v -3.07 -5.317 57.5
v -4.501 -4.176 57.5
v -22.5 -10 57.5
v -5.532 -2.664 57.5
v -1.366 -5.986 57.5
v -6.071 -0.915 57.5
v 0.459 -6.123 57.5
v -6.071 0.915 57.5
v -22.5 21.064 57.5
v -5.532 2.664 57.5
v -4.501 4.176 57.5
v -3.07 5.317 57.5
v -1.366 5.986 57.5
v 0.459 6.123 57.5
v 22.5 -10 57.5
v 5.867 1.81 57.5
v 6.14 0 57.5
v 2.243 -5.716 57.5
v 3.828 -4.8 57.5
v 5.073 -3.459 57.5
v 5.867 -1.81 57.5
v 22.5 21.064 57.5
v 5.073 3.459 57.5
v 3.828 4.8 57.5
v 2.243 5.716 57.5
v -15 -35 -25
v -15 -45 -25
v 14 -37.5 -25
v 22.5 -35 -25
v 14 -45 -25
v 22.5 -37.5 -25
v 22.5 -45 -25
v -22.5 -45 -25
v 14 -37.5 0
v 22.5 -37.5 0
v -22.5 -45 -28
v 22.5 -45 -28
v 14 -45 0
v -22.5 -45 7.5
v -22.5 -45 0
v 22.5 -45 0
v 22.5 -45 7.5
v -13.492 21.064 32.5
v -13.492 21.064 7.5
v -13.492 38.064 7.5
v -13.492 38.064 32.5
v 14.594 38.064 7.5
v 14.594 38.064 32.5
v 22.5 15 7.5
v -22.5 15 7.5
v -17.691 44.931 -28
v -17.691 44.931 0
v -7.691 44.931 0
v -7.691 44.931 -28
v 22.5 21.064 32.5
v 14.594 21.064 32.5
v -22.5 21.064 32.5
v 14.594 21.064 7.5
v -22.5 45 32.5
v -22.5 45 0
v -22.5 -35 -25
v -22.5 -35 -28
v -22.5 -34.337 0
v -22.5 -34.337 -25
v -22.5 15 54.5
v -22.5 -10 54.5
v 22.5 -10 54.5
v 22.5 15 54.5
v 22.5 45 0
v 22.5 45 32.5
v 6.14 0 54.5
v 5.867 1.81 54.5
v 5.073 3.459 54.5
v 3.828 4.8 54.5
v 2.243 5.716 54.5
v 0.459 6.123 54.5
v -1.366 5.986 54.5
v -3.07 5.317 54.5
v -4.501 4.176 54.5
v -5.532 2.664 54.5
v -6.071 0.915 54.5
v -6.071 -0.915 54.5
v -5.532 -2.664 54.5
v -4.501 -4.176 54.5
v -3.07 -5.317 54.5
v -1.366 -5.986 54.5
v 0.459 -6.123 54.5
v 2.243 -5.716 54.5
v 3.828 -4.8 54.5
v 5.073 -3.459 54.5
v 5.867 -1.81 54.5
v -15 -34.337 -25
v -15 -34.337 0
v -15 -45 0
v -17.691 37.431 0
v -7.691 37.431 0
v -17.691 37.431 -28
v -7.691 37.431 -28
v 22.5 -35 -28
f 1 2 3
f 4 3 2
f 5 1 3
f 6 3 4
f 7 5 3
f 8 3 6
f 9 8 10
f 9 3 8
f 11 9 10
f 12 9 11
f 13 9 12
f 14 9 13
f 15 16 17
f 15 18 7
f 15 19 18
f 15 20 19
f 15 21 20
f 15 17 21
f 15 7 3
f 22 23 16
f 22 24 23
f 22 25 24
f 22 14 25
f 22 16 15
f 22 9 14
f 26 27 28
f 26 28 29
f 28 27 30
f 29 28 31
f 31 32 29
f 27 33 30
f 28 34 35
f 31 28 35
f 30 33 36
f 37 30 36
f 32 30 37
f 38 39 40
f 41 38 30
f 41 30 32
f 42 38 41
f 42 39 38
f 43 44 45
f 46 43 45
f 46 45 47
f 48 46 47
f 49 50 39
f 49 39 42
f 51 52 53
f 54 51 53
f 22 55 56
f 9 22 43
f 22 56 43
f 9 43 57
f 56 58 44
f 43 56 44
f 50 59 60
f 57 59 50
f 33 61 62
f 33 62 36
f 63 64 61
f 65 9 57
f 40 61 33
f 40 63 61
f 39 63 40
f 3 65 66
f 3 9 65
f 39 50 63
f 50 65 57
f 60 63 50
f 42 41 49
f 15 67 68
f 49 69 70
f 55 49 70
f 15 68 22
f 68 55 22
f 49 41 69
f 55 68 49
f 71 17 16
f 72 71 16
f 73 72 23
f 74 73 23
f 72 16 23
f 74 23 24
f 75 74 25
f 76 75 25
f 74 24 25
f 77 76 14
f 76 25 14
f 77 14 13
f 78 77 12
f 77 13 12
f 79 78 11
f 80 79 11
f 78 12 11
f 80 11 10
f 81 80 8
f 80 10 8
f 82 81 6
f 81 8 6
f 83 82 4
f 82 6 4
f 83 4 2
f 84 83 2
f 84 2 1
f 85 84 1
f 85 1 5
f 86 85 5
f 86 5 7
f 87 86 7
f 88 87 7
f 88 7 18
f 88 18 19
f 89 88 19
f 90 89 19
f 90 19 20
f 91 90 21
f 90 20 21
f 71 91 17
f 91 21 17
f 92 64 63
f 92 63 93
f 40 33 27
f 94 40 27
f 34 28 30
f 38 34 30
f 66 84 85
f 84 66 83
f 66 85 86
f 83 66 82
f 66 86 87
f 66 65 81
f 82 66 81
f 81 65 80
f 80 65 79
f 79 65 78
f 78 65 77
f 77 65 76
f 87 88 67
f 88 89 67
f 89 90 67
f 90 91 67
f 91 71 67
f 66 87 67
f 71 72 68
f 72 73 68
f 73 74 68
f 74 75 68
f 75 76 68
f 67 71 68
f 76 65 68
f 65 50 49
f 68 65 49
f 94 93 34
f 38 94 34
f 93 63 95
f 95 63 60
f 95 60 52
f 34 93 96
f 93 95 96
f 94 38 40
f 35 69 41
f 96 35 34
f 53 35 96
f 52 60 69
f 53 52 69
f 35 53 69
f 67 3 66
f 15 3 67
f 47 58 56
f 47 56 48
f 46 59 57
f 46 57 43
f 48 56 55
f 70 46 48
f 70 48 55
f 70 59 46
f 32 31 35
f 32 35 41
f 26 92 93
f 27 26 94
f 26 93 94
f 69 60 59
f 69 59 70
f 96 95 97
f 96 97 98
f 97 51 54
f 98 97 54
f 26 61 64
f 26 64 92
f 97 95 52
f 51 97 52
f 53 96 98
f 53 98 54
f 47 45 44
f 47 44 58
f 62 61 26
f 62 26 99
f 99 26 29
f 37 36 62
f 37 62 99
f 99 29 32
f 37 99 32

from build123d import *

# Parameters (mm, degrees)
F0_W      = 45
F0_H      = 90
F1_DEPTH  = 7.5
F2_W      = 45
F2_H      = 30
F2_W_2    = 28.085665
F2_H_2    = 17
F3_DEPTH  = 25
F5_DEPTH  = 25
F6_W      = 45
F6_H      = 3
F7_DEPTH  = 25
F8_R      = 6.14005
F9_DEPTH  = 3
F10_W     = 8.500325
F10_H     = 7.5
F11_DEPTH = 25
F12_W     = 7.5
F12_H     = 10.662651
F13_DEPTH = 25
F14_W     = 10
F14_H     = 7.5
F15_DEPTH = 28
F16_W     = 45
F16_H     = 10
F17_DEPTH = 3


with BuildPart() as f1:
    # F0 (on Top) → F1 (new body)
    with BuildSketch(Plane.XY):
        Rectangle(F0_W, F0_H)
    extrude(amount=F1_DEPTH)

    # F2 (on face) → F3 (join)
    with BuildSketch(Plane.XY.offset(7.5)):
        with Locations((0, 30)):
            Rectangle(F2_W, F2_H)
        with Locations((0.5507, 29.56425)):
            Rectangle(F2_W_2, F2_H_2, mode=Mode.SUBTRACT)
    extrude(amount=F3_DEPTH)

    # F4 (on face) → F5 (join)
    with BuildSketch(Plane.XY.offset(32.5)):
        Polygon((-22.5, 15), (22.5, 15), (22.5, 21.06425), (14.593532, 21.06425), (-13.492133, 21.06425), (-22.5, 21.06425), align=None)
    extrude(amount=F5_DEPTH)

    # F6 (on face) → F7 (join)
    with BuildSketch(Plane.XZ.offset(-15)):
        with Locations((0, 56)):
            Rectangle(F6_W, F6_H)
    extrude(amount=F7_DEPTH)

    # F8 (on face) → F9 (cut, through all)
    with BuildSketch(Plane.XY.offset(57.5)):
        Circle(F8_R)
    extrude(amount=-F9_DEPTH, mode=Mode.SUBTRACT)

    # F10 (on face) → F11 (join)
    with BuildSketch(Plane(origin=(0, 0, 0), x_dir=(1, 0, 0), z_dir=(0, 0, -1))):
        with Locations((18.249837, 41.25)):
            Rectangle(F10_W, F10_H)
    extrude(amount=F11_DEPTH)

    # F12 (on face) → F13 (join)
    with BuildSketch(Plane(origin=(0, 0, 0), x_dir=(1, 0, 0), z_dir=(0, 0, -1))):
        with Locations((-18.75, 39.668674)):
            Rectangle(F12_W, F12_H)
    extrude(amount=F13_DEPTH)

    # F14 (on Top) → F15 (join)
    with BuildSketch(Plane.XY):
        with Locations((-12.690873, 41.181121)):
            Rectangle(F14_W, F14_H)
    extrude(amount=-F15_DEPTH)

    # F16 (on face) → F17 (join)
    with BuildSketch(Plane(origin=(0, 0, -25), x_dir=(1, 0, 0), z_dir=(0, 0, -1))):
        with Locations((0, 40)):
            Rectangle(F16_W, F16_H)
    extrude(amount=F17_DEPTH)


solid = f1.part
